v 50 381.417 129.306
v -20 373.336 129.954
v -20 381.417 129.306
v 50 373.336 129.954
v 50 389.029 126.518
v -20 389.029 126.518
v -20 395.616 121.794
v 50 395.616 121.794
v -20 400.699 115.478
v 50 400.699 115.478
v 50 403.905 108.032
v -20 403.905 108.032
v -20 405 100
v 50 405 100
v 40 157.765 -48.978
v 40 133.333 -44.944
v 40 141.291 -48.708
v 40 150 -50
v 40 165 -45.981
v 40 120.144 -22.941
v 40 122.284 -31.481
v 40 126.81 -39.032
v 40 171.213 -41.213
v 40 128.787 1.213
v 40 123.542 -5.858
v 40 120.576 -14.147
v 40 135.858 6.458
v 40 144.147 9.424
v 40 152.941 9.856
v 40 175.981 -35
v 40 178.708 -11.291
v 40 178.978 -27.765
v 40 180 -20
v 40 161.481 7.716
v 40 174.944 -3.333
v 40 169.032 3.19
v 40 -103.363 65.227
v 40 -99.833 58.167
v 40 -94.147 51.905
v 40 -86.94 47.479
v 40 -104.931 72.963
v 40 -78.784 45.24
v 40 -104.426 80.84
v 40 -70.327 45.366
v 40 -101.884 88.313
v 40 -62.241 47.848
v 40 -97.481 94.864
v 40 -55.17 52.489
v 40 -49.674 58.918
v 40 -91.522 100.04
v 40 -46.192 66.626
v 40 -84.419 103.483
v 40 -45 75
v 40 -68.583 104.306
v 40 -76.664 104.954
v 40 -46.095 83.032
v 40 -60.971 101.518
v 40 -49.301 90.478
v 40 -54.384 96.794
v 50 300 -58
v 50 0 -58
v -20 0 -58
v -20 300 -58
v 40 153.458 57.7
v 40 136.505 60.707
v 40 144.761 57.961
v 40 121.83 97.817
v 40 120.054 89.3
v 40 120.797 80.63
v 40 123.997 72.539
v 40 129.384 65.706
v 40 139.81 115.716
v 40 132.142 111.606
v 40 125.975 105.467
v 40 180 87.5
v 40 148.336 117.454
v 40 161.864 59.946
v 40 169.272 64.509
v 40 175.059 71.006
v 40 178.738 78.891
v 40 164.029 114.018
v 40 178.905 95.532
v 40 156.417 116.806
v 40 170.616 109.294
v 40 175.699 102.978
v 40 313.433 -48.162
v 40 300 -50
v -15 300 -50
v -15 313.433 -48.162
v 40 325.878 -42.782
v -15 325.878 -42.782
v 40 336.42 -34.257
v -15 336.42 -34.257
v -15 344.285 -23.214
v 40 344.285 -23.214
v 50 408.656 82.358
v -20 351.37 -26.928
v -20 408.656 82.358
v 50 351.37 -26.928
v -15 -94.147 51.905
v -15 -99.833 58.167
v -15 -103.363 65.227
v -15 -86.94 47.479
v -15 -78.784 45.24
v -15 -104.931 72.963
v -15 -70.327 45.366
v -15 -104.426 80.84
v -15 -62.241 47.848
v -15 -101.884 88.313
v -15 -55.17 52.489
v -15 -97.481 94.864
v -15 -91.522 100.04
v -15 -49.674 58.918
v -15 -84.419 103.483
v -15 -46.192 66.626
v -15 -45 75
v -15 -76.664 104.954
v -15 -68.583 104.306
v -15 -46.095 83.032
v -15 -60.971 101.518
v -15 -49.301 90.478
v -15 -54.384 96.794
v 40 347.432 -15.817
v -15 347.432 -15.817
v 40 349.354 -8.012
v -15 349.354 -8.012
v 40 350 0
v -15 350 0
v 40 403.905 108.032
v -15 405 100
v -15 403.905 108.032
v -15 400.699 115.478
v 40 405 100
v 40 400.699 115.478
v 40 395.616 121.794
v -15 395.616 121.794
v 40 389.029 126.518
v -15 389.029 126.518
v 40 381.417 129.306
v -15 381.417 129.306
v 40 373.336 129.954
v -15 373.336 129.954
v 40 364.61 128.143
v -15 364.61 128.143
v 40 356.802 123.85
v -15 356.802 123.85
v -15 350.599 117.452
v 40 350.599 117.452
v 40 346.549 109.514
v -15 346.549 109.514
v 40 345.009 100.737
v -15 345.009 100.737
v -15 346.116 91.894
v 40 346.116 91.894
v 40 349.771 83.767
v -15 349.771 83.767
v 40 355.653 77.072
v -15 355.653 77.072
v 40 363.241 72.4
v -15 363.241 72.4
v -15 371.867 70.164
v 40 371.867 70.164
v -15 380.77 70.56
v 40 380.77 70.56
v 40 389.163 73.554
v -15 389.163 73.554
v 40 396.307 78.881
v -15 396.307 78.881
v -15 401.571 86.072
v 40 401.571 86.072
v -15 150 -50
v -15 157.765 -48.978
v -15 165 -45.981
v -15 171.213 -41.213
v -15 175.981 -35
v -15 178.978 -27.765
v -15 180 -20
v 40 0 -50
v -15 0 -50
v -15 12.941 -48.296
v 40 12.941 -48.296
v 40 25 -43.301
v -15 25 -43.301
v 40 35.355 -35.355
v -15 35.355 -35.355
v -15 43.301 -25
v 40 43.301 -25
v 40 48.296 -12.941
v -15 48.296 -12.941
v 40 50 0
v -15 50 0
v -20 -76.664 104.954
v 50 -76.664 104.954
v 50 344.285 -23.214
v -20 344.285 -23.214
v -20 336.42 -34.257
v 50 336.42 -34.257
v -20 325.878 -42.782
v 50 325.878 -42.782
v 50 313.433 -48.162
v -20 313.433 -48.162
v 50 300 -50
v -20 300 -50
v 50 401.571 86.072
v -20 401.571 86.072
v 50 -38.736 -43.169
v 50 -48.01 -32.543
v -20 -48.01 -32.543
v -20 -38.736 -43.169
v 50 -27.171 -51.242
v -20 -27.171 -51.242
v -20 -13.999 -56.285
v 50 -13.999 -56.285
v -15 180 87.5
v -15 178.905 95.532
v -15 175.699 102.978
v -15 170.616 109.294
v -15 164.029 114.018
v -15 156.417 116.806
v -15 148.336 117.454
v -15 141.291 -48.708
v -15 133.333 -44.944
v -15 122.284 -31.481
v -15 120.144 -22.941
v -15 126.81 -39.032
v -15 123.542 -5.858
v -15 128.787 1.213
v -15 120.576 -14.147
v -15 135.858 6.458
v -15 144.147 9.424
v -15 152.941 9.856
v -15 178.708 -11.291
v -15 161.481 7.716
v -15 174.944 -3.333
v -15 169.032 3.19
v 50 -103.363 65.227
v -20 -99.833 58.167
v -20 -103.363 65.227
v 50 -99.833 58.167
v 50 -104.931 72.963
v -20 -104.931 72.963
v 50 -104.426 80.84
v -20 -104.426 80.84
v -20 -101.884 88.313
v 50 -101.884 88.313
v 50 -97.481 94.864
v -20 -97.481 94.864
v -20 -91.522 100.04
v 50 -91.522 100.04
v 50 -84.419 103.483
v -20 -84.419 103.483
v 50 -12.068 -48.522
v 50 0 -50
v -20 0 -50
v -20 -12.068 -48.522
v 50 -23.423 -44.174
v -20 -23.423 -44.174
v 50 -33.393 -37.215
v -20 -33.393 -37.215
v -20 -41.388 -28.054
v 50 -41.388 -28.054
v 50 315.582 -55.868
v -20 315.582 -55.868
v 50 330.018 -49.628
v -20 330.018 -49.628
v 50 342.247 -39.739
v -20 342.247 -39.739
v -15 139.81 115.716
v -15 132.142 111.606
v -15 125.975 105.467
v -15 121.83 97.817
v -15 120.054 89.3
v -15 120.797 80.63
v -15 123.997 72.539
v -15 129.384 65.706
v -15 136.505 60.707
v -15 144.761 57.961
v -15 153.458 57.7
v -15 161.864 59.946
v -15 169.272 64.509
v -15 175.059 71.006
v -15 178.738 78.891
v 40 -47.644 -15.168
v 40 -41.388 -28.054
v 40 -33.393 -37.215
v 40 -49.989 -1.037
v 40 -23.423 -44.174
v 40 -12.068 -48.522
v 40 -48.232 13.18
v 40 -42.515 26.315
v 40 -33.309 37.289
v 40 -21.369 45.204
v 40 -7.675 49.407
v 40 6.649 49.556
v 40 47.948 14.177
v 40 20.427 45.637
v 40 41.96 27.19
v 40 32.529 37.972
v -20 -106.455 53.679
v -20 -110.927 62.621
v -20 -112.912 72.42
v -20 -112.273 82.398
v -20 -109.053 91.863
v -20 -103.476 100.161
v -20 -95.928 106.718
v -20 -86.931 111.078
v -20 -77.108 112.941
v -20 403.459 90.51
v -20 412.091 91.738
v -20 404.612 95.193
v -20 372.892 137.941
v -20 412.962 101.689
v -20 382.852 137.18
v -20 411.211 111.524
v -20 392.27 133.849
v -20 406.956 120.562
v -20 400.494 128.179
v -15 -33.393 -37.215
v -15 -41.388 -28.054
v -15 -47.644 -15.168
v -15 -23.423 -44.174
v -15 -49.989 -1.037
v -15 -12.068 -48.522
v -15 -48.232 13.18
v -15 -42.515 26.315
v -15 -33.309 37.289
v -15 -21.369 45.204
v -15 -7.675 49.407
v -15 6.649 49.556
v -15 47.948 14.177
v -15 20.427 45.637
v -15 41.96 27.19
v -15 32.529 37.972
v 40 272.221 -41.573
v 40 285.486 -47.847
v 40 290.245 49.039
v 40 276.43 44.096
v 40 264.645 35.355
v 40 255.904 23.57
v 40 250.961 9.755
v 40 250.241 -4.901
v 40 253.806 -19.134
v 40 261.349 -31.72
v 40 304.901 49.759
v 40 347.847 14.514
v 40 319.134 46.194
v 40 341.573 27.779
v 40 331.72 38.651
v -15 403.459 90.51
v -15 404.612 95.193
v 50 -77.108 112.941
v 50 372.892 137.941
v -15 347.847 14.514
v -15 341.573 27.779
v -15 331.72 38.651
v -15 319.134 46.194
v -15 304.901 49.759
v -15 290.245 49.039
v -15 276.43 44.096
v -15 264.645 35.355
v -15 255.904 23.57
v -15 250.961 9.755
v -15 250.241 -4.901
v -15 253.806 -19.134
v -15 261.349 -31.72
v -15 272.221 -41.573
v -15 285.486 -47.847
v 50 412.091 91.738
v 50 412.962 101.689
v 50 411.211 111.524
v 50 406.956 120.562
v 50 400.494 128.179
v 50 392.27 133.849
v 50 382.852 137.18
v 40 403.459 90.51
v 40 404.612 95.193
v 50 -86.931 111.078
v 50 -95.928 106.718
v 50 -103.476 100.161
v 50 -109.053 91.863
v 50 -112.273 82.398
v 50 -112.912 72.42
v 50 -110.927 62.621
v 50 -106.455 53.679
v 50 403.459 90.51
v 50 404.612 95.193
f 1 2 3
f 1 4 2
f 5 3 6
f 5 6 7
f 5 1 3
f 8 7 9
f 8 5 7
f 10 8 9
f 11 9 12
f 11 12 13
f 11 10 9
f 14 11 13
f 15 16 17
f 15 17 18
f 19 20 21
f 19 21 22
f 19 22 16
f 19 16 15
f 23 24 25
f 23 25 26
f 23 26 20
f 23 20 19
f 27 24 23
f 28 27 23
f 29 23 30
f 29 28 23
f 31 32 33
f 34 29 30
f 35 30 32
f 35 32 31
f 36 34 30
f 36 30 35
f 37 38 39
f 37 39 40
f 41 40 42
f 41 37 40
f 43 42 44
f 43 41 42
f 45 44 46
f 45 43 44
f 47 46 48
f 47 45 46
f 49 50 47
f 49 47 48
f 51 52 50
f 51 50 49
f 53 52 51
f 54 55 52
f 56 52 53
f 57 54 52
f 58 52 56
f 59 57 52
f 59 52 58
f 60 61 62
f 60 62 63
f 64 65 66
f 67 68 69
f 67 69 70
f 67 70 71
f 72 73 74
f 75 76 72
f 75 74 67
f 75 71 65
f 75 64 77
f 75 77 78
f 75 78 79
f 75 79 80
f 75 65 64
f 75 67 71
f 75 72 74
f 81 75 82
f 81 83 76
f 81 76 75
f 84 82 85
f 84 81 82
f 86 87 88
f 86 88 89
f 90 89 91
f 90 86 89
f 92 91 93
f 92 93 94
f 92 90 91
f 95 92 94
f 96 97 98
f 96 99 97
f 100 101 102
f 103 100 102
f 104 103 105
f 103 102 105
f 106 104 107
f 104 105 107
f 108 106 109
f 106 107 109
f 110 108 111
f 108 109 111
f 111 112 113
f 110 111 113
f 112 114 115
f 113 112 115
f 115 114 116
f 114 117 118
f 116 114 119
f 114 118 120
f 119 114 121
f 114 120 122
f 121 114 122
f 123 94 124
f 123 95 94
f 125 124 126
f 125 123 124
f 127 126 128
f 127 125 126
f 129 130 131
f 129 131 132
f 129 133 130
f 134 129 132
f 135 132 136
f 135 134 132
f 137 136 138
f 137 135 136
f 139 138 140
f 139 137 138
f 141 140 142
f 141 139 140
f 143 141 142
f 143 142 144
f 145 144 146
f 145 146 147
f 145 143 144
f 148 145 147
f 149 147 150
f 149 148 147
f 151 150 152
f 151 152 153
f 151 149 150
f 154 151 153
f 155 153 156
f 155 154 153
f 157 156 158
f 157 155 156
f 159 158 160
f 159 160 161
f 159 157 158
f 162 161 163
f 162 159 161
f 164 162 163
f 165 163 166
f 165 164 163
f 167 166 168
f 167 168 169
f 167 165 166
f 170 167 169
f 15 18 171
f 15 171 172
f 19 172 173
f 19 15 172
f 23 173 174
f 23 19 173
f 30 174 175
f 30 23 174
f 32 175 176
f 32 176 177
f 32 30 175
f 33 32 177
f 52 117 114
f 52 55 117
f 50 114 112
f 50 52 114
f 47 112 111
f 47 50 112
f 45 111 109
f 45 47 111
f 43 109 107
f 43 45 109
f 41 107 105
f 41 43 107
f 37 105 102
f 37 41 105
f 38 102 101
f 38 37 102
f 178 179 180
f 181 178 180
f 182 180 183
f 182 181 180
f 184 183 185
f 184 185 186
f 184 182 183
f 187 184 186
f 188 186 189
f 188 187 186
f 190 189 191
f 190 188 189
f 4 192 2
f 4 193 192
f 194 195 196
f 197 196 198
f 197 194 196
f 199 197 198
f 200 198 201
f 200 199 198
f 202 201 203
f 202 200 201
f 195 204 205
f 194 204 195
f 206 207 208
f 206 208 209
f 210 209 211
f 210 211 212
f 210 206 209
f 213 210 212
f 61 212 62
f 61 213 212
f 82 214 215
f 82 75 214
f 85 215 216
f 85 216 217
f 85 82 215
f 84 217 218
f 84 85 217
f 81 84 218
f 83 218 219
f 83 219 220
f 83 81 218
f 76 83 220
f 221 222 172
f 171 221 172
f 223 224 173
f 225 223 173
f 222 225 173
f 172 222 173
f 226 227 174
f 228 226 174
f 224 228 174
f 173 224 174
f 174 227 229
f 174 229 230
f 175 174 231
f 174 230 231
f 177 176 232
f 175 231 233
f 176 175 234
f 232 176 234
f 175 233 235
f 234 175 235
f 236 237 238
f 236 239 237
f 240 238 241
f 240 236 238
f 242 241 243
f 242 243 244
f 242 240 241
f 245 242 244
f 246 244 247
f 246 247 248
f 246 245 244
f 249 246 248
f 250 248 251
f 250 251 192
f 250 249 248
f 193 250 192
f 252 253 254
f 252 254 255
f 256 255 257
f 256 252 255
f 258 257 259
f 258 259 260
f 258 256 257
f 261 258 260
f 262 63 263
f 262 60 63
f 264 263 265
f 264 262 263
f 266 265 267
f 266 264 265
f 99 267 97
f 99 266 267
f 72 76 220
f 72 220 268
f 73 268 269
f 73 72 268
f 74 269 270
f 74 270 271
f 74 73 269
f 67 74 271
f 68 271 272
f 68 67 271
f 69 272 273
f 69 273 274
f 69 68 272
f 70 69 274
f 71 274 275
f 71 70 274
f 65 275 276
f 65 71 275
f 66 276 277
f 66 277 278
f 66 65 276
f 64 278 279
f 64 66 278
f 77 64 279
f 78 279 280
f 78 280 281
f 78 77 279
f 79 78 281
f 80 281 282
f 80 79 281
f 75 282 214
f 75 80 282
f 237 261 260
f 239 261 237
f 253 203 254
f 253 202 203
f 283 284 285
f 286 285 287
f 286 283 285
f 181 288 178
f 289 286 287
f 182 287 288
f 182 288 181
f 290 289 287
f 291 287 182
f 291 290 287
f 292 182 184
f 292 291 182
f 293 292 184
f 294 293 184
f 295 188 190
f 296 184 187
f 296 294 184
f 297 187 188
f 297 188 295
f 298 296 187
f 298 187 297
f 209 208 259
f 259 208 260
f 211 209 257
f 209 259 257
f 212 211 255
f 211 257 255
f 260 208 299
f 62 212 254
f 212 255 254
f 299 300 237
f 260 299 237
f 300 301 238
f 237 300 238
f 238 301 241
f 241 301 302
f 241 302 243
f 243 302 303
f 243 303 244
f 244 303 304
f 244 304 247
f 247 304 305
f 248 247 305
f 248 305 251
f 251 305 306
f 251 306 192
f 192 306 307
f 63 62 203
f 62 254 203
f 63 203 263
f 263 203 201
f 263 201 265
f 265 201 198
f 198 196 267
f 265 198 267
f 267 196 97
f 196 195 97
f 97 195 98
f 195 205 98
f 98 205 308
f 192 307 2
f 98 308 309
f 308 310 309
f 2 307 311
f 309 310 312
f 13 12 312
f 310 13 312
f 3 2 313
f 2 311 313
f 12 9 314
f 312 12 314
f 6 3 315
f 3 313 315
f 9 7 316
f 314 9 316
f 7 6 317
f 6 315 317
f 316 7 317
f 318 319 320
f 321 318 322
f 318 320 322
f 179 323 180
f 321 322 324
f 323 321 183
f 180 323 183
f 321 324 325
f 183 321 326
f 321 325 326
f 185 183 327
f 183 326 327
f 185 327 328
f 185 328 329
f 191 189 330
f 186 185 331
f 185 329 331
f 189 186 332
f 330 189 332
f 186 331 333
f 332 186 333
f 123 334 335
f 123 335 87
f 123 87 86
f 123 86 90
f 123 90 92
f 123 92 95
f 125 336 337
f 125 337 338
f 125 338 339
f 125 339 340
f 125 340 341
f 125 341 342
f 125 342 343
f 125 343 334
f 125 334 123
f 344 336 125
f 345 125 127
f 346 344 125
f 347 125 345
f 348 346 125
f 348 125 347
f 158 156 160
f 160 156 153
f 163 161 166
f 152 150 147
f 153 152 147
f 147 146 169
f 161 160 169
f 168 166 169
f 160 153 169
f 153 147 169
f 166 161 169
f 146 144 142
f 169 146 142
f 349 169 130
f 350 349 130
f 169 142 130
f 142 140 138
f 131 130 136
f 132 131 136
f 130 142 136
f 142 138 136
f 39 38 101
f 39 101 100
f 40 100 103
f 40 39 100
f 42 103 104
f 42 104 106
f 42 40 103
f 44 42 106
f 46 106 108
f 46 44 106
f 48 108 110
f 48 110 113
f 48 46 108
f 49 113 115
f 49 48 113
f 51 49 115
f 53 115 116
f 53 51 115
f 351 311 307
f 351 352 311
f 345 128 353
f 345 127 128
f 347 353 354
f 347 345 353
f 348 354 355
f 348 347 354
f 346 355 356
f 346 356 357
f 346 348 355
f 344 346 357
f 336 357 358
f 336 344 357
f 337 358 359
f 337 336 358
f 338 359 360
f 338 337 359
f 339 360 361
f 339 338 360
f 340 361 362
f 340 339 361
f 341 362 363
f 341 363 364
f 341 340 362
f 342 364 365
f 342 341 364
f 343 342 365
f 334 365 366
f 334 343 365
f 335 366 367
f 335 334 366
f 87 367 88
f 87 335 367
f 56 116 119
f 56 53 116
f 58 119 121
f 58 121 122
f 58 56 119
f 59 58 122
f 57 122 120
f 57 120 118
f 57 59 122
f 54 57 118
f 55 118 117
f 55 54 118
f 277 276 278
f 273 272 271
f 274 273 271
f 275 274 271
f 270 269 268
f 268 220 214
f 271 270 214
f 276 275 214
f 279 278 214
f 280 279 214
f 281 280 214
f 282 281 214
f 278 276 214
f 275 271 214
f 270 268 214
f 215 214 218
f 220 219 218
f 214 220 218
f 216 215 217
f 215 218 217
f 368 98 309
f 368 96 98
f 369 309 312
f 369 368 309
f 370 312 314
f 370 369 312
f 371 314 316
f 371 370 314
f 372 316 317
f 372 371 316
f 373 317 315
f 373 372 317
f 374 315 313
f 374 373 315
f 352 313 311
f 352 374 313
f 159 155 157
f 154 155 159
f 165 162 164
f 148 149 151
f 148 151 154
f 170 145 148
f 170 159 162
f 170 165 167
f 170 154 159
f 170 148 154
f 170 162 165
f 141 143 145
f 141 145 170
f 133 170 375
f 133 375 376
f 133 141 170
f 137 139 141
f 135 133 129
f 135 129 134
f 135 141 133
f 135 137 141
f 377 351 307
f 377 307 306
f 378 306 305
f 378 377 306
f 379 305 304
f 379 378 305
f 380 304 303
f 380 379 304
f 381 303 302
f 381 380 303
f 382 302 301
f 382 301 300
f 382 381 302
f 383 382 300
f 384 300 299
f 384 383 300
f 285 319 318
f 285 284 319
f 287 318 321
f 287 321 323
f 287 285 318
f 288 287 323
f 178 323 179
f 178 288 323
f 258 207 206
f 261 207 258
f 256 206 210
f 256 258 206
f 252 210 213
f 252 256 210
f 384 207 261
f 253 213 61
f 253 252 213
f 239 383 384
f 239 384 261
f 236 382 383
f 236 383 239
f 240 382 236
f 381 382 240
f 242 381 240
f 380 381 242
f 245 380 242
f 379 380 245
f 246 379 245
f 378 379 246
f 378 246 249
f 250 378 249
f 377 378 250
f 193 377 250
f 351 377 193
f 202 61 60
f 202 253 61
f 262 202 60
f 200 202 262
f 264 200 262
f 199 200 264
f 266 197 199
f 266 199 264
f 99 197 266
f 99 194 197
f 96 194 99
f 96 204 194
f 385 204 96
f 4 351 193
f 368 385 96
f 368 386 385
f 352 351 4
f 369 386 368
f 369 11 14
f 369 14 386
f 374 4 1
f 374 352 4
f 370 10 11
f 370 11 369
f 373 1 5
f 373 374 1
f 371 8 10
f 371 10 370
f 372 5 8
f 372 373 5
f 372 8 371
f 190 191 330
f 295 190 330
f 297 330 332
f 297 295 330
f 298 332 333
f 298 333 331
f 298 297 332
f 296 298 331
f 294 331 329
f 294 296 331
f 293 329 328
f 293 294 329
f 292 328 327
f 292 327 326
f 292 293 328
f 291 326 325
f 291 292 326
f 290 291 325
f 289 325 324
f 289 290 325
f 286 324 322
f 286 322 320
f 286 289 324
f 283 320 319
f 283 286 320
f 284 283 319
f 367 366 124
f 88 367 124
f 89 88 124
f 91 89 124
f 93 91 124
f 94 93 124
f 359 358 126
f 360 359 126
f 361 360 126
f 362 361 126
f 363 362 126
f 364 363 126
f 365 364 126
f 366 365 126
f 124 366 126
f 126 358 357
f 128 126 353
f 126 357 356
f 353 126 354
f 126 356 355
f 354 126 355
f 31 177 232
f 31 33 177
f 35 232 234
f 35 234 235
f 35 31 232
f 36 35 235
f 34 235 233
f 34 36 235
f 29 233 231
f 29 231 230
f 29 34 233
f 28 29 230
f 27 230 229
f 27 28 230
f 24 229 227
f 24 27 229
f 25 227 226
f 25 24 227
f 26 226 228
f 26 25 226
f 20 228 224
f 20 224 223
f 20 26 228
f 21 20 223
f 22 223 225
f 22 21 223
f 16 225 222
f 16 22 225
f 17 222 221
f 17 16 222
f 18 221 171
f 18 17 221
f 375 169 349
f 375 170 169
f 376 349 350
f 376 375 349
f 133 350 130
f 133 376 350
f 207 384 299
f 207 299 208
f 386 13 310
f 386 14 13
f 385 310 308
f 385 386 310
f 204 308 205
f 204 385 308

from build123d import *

# Parameters (mm, degrees)
F1_DEPTH      = 40
F1_DEPTH_BACK = 15
F2_DEPTH      = 50
F2_DEPTH_BACK = 20


with BuildPart() as f1:
    # F0 (on Right) → F1 (new body, two sides)
    with BuildSketch(Plane.YZ) as f1_sk:
        with BuildLine():
            ThreePointArc((0, -50), (35.355339, -35.355339), (50, 0))
            ThreePointArc((50, 0), (-14.673294, 47.798477), (-41.387778, -28.054444))
            ThreePointArc((-41.387778, -28.054444), (-23.423042, -44.174213), (0, -50))
        make_face()
        with BuildLine():
            ThreePointArc((-76.664101, 104.953811), (-101.884257, 88.313028), (-99.832667, 58.167333))
            ThreePointArc((-99.832667, 58.167333), (-66.196024, 46.320914), (-45, 75))
            ThreePointArc((-45, 75), (-54.383538, 96.793612), (-76.664101, 104.953811))
        make_face()
        with BuildLine():
            ThreePointArc((180, 87.5), (170.616462, 109.293612), (148.335899, 117.453811))
            ThreePointArc((148.335899, 117.453811), (129.383538, 65.706388), (180, 87.5))
        make_face()
        with BuildLine():
            ThreePointArc((350, 0), (264.644661, 35.355339), (300, -50))
            ThreePointArc((300, -50), (325.877833, -42.782447), (344.284681, -23.21351))
            ThreePointArc((344.284681, -23.21351), (348.550149, -11.953367), (350, 0))
        make_face()
        with BuildLine():
            ThreePointArc((405, 100), (395.616462, 121.793612), (373.335899, 129.953811))
            ThreePointArc((373.335899, 129.953811), (349.771213, 83.767061), (401.570808, 86.071894))
            ThreePointArc((401.570808, 86.071894), (404.13009, 92.82798), (405, 100))
        make_face()
        with BuildLine():
            ThreePointArc((180, -20), (128.786797, 1.213203), (150, -50))
            ThreePointArc((150, -50), (171.213203, -41.213203), (180, -20))
        make_face()
    extrude(amount=F1_DEPTH)
    extrude(f1_sk.sketch, amount=-F1_DEPTH_BACK)


with BuildPart() as f2:
    # F0 (on Right) → F2 (new body, two sides)
    with BuildSketch(Plane.YZ) as f2_sk:
        with BuildLine():
            Line((372.892139, 137.941493), (-77.107861, 112.941493))
            ThreePointArc((-77.107861, 112.941493), (-109.053392, 91.863169), (-106.454711, 53.678622))
            Line((-106.454711, 53.678622), (-48.009822, -32.543156))
            ThreePointArc((-48.009822, -32.543156), (-27.170729, -51.242087), (0, -58))
            Line((0, -58), (300, -58))
            ThreePointArc((300, -58), (330.018286, -49.627638), (351.370229, -26.927672))
            Line((351.370229, -26.927672), (408.656357, 82.357732))
            ThreePointArc((408.656357, 82.357732), (406.956463, 120.561723), (372.892139, 137.941493))
        make_face()
        with BuildLine():
            ThreePointArc((0, -50), (-23.423042, -44.174213), (-41.387778, -28.054444))
            Line((-41.387778, -28.054444), (-99.832667, 58.167333))
            ThreePointArc((-99.832667, 58.167333), (-101.884257, 88.313028), (-76.664101, 104.953811))
            Line((-76.664101, 104.953811), (148.335899, 117.453811))
            Line((148.335899, 117.453811), (373.335899, 129.953811))
            ThreePointArc((373.335899, 129.953811), (395.616462, 121.793612), (405, 100))
            ThreePointArc((405, 100), (404.13009, 92.82798), (401.570808, 86.071894))
            Line((401.570808, 86.071894), (344.284681, -23.21351))
            ThreePointArc((344.284681, -23.21351), (325.877833, -42.782447), (300, -50))
            Line((300, -50), (150, -50))
            Line((150, -50), (0, -50))
        make_face(mode=Mode.SUBTRACT)
    extrude(amount=F2_DEPTH)
    extrude(f2_sk.sketch, amount=-F2_DEPTH_BACK)


solid = Compound([f1.part, f2.part])
